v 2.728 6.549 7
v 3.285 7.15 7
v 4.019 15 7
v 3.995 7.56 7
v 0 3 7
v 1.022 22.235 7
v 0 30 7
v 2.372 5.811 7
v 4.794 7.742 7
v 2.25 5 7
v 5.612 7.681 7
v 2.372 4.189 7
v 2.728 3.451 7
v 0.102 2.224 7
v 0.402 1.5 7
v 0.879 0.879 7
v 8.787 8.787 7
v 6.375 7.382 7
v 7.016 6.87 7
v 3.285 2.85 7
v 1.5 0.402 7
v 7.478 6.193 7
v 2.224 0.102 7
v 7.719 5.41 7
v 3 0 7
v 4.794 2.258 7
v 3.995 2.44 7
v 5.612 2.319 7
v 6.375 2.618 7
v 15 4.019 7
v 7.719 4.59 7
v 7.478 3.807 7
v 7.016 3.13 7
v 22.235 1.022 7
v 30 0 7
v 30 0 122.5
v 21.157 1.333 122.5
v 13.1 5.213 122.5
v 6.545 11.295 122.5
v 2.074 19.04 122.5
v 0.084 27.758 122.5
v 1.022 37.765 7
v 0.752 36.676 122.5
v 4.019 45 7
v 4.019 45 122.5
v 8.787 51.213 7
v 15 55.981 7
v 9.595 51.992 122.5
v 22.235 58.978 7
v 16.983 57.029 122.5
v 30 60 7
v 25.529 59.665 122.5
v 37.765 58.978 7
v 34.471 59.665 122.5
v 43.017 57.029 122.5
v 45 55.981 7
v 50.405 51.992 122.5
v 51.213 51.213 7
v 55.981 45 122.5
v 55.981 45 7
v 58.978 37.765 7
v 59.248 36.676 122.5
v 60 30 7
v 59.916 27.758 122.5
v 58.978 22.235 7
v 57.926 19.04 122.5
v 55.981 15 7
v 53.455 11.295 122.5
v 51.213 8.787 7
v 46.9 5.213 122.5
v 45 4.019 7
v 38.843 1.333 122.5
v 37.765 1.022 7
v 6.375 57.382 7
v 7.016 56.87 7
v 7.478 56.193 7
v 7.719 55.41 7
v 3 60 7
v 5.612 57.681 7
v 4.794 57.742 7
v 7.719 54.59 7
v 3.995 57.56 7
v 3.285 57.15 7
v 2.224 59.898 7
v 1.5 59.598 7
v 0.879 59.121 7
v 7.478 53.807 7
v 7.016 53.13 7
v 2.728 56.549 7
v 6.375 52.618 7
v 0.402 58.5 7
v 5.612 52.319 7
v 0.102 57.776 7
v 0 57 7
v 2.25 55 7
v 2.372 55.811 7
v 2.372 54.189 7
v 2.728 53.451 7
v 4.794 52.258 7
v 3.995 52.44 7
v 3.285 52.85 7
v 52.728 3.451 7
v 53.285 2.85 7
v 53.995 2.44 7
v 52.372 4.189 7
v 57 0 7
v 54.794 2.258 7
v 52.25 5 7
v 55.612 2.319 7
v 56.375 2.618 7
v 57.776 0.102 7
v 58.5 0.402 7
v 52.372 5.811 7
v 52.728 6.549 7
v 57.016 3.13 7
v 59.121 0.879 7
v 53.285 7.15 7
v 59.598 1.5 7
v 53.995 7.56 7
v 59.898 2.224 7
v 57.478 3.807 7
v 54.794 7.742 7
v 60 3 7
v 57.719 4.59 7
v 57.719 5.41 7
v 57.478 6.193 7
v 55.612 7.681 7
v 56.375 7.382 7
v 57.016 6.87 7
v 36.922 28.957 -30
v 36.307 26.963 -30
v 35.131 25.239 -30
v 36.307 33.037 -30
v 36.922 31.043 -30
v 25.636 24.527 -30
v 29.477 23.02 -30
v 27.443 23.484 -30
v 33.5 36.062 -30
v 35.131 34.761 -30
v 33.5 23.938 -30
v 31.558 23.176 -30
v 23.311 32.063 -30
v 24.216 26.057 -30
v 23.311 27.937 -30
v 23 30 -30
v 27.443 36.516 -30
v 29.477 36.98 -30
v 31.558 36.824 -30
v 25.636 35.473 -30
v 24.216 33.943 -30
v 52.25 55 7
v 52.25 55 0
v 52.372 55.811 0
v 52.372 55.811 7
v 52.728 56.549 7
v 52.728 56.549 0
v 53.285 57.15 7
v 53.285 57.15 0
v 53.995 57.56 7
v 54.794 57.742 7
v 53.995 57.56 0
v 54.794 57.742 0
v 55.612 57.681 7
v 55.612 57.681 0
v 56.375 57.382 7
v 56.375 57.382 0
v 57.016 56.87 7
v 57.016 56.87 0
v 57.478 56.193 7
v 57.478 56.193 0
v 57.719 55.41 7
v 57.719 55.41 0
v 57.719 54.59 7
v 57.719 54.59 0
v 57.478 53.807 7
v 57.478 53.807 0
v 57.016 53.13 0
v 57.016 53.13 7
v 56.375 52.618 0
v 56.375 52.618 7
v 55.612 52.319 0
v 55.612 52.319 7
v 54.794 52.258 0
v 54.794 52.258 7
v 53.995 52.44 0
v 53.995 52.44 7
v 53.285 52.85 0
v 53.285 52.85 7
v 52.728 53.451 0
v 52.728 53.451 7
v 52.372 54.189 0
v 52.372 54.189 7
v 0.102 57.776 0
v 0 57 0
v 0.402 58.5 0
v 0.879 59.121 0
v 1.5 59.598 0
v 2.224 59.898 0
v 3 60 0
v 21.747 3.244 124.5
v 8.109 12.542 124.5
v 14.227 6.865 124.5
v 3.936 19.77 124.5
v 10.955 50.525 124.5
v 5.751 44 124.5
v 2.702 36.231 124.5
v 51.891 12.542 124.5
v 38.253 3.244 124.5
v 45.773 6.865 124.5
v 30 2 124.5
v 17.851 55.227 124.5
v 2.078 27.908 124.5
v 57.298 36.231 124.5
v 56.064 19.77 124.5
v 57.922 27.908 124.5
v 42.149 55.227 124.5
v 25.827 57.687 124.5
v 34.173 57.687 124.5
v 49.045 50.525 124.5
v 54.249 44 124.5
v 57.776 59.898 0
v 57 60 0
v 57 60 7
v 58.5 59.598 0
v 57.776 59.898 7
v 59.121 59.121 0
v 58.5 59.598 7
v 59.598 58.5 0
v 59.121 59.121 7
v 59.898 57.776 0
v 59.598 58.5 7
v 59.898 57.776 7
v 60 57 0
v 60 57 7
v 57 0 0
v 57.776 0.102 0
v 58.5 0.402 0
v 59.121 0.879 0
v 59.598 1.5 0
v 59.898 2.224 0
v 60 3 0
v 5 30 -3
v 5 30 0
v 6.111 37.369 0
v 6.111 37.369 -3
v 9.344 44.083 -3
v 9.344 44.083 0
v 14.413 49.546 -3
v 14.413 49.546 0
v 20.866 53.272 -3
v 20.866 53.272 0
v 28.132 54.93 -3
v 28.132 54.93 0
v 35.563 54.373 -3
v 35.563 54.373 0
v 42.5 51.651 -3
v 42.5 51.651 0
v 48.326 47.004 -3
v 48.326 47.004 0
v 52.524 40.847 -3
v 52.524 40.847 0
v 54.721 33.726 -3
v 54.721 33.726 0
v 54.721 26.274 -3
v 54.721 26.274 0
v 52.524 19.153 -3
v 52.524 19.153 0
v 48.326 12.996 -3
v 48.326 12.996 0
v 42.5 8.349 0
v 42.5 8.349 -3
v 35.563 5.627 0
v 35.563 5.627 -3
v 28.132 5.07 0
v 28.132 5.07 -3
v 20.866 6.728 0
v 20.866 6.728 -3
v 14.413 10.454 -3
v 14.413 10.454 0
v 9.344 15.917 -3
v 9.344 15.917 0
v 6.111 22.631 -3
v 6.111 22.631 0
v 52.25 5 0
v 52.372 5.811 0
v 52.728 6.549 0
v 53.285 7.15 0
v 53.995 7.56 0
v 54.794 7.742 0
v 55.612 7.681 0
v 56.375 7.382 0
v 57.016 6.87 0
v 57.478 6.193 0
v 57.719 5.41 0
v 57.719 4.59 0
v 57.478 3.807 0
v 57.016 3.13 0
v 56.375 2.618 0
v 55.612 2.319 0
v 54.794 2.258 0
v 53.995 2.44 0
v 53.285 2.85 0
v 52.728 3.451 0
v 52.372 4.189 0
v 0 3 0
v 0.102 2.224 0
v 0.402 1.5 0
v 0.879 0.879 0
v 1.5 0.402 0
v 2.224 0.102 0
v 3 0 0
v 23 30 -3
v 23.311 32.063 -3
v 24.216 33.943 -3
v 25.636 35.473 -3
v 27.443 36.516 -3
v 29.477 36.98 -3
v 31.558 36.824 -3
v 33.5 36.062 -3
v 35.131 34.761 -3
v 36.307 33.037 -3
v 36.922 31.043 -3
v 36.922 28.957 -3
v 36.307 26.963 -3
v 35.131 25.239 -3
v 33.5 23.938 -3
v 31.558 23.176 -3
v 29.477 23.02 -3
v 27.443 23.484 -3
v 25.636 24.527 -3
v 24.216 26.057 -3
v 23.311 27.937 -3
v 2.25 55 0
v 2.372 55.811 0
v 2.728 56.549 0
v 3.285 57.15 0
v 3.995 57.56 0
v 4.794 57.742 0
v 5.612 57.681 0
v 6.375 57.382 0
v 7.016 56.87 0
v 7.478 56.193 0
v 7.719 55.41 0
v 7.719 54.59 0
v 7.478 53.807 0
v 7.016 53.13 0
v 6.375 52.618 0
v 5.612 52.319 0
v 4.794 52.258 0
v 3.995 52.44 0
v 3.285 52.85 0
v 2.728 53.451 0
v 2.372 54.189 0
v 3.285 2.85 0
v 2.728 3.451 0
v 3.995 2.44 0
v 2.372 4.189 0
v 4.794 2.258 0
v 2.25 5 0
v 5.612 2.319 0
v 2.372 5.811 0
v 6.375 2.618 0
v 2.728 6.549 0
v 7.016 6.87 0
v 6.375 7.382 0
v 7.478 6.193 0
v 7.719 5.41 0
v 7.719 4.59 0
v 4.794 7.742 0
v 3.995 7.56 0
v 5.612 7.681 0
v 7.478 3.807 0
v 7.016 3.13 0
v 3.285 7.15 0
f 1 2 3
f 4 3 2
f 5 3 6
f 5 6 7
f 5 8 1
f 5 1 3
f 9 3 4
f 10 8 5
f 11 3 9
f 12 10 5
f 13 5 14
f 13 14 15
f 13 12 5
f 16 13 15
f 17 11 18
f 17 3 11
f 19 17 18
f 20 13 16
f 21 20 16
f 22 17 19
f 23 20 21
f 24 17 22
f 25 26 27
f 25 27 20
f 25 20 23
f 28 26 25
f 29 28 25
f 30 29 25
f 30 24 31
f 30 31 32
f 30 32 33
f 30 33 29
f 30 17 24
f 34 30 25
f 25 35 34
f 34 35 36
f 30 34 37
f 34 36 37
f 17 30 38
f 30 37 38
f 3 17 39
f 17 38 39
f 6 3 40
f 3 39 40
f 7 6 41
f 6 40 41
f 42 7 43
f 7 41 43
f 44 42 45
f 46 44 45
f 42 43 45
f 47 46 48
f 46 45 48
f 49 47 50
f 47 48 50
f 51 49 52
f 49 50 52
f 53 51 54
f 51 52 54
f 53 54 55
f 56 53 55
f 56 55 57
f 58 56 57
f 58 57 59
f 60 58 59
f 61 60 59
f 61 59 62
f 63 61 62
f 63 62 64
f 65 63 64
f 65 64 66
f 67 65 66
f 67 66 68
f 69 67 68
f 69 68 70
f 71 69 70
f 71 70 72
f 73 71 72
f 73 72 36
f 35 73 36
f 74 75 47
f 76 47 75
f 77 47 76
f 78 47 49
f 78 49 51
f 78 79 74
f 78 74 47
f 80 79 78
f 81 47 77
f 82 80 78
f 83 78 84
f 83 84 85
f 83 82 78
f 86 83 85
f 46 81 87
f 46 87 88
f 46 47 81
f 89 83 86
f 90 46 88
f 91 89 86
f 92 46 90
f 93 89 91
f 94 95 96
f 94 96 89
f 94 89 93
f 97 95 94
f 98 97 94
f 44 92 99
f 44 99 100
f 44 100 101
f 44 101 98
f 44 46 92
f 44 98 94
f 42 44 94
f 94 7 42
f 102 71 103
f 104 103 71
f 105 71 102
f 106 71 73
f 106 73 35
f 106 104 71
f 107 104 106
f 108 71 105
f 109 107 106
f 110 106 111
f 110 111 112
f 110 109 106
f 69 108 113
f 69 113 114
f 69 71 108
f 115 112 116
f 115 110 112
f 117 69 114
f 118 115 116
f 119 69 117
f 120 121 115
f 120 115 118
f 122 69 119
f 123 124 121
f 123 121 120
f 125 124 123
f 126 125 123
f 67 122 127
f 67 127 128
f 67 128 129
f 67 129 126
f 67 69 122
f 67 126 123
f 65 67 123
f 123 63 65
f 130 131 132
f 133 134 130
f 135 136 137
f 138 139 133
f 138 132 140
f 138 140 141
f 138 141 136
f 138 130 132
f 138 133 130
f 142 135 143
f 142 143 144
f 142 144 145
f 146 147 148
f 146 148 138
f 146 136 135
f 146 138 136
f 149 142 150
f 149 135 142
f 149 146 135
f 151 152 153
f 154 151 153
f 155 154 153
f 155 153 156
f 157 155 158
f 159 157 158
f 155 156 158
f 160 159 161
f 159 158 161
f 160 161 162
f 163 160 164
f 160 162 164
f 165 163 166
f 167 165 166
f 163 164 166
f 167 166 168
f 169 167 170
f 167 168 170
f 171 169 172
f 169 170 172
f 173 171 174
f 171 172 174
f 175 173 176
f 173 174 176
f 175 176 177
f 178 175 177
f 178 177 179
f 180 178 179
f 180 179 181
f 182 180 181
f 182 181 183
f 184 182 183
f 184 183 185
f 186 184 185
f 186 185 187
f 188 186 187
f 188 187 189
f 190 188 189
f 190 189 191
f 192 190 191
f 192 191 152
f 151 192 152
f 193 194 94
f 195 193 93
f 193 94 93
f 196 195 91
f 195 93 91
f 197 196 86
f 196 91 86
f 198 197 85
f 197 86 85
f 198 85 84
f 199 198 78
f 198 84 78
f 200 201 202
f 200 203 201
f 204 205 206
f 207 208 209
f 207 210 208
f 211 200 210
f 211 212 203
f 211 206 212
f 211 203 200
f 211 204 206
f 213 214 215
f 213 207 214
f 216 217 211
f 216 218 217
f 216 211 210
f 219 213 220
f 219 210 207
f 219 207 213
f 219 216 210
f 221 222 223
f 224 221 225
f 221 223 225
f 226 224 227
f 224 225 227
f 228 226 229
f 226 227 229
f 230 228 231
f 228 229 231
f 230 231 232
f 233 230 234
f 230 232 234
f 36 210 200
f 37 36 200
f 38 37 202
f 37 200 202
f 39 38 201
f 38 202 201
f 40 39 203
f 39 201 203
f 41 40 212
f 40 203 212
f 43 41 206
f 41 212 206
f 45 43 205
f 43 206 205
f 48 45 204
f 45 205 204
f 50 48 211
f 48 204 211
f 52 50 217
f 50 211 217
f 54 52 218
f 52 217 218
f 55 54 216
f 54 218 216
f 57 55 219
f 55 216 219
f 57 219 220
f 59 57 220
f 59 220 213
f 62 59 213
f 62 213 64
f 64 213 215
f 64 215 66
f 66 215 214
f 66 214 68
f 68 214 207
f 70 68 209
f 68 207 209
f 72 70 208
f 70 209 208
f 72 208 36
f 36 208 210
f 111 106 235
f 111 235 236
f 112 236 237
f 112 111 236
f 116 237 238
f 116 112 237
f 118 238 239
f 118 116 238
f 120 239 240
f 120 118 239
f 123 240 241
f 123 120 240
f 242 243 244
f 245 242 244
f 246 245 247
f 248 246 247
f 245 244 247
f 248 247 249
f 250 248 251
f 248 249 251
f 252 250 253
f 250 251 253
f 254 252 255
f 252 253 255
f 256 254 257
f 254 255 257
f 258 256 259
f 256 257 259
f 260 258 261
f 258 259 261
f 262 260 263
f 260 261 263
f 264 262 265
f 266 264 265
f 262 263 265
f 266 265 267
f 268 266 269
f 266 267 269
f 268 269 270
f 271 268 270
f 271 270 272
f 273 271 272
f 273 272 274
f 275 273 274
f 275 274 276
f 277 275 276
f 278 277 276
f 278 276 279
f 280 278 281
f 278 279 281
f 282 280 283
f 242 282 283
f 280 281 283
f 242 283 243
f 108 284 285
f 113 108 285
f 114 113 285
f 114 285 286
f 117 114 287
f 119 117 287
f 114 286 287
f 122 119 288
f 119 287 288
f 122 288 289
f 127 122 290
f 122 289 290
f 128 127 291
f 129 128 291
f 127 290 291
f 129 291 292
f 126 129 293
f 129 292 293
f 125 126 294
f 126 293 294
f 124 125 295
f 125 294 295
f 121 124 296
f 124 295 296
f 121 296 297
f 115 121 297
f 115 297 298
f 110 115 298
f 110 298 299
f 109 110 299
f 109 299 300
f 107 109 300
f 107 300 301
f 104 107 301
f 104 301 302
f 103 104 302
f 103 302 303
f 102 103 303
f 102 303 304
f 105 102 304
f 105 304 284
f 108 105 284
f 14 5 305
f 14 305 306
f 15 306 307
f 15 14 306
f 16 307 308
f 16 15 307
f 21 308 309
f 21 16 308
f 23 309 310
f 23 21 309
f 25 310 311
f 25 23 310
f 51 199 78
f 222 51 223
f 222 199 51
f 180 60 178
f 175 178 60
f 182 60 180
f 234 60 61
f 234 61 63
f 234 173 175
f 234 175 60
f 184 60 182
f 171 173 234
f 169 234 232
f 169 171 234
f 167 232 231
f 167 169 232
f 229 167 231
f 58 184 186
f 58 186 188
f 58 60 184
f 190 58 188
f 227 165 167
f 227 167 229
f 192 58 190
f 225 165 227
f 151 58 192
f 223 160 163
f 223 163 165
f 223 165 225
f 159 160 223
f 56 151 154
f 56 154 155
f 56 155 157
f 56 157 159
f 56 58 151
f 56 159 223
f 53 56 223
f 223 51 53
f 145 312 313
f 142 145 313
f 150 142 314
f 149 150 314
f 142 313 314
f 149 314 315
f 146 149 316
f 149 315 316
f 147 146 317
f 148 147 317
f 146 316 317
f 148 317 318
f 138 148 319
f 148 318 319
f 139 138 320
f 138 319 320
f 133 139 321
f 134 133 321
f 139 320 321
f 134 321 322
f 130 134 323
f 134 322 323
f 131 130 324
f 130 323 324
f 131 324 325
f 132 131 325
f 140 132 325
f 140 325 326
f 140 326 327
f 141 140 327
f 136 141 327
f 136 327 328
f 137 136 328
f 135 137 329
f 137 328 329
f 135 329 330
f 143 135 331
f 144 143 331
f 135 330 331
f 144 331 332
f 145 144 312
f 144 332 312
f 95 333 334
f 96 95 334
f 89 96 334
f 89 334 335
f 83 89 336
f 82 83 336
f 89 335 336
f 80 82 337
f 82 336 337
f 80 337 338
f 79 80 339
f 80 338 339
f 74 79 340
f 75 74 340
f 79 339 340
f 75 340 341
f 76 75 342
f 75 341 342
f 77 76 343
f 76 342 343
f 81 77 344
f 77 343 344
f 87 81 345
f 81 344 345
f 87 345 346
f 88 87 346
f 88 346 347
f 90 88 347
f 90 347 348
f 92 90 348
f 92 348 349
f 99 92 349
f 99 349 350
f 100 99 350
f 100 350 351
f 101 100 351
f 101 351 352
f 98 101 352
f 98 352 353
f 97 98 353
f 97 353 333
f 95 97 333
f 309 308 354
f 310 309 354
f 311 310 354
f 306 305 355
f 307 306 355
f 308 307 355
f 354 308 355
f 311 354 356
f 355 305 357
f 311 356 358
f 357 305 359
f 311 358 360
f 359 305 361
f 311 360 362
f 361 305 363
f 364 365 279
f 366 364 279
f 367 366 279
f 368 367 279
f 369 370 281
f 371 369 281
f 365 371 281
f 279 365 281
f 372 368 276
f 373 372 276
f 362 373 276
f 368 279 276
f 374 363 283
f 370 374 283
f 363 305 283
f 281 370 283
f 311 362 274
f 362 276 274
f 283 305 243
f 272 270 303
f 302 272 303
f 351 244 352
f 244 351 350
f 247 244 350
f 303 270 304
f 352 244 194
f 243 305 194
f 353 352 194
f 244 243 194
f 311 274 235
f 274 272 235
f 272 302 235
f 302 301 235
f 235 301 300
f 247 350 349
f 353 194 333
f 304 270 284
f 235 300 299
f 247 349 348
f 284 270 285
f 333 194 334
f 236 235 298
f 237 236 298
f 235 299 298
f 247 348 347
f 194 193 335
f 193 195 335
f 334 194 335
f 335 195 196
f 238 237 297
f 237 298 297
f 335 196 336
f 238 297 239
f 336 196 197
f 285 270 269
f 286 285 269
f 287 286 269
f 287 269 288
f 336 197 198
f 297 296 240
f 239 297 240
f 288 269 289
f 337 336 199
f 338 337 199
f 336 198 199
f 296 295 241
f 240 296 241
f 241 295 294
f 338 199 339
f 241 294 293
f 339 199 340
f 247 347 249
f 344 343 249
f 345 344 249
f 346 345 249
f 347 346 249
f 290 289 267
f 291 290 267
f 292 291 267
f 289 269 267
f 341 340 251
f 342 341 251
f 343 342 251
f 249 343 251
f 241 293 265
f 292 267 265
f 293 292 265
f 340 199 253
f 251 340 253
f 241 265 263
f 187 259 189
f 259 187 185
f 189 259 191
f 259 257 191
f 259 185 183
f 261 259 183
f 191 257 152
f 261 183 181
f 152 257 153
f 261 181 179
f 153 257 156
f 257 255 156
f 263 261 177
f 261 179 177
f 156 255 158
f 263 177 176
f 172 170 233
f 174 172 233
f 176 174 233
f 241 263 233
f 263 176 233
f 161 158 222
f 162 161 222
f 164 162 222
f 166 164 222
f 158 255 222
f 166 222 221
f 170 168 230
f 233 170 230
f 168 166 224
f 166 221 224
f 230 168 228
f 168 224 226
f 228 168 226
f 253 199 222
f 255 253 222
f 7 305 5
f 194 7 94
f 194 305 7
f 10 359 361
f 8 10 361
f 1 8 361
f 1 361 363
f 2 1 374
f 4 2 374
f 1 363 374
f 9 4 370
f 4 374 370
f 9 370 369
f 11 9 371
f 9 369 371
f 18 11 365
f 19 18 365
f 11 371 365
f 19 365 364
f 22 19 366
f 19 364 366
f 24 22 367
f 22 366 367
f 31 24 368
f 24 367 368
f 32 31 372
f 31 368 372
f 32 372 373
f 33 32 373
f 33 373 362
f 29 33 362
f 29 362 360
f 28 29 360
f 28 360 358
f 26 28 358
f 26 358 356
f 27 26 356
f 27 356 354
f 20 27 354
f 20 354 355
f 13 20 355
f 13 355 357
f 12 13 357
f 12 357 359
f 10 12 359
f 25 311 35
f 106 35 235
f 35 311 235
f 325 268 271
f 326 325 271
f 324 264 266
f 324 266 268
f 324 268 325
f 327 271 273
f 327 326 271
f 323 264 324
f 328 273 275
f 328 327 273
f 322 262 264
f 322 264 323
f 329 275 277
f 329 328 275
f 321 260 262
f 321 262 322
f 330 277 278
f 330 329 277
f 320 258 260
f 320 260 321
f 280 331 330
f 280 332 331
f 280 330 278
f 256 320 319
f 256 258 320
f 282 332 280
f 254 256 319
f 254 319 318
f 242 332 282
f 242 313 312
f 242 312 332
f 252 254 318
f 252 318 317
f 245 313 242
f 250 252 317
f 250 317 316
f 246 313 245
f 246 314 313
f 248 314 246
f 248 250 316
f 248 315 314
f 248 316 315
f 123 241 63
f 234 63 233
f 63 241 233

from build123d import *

# Parameters (mm, degrees)
SKETCH_1_W               = 60.00000000000001
SKETCH_1_H               = 60.00000000000001
EXTRUDE_1_DEPTH          = 124.5
SKETCH_2_R               = 25
EXTRUDE_2_DEPTH          = 3
SKETCH_3_R               = 6.999999999999999
EXTRUDE_3_DEPTH          = 27
FILLET_1_R               = 3
CUT_EXTRUDE_1_DEPTH      = 117.5
PATTERN_CIRCULAR_1_COUNT = 4
CHAMFER_1_SIZE           = 2
SKETCH_5_R               = 2.75
SKETCH_5_R_2             = 2.7500000000000018
SKETCH_5_R_3             = 2.7500000000000004
SKETCH_5_R_4             = 2.750000000000002
CUT_EXTRUDE_2_DEPTH      = 151.66602138504885


with BuildPart() as part:
    # 草圖1 → 伸長1 (new body)
    with BuildSketch(Plane.XY):
        with Locations((30.000000000000004, 30.000000000000004)):
            Rectangle(SKETCH_1_W, SKETCH_1_H)
    extrude(amount=EXTRUDE_1_DEPTH)

    # 草圖2 → 伸長2 (add)
    with BuildSketch(Plane(origin=(0, 0, 0), x_dir=(-1, 0, 0), z_dir=(0, 0, -1))):
        with Locations((-30.000000000000007, 30)):
            Circle(SKETCH_2_R)
    extrude(amount=EXTRUDE_2_DEPTH)

    # 草圖3 → 伸長3 (add)
    with BuildSketch(Plane(origin=(0, 0, -3), x_dir=(-1, 0, 0), z_dir=(0, 0, -1))):
        with Locations((-30.000000000000007, 30)):
            Circle(SKETCH_3_R)
    extrude(amount=EXTRUDE_3_DEPTH)

    # 圓角1
    fillet_1_edges = [part.edges().sort_by_distance(p)[0] for p in [
        (0, 60, 62.25),
        (60, 60, 62.25),
        (60, 0, 62.25),
        (0, 0, 62.25),
    ]]
    fillet(fillet_1_edges, radius=FILLET_1_R)

    # 草圖4 → 除料-伸長1 (cut)
    with BuildSketch(Plane.XY.offset(124.5)):
        with BuildLine():
            Line((60, 3), (60, 30.000000000000007))
            ThreePointArc((60, 30.000000000000007), (51.213203435596434, 8.786796564403577), (30, 0))
            Line((30, 0), (56.99999999999999, 0))
            ThreePointArc((56.99999999999999, 0), (59.12132034355964, 0.8786796564403576), (60, 3))
        make_face()
    cut_extrude_1 = extrude(amount=-CUT_EXTRUDE_1_DEPTH, mode=Mode.SUBTRACT)

    # 環狀複製排列1: 除料-伸長1 ×4 about axis
    pattern_circular_1_axis = Axis((30, 30, 0), (0, 0, 1))
    for i in range(1, PATTERN_CIRCULAR_1_COUNT):
        add(cut_extrude_1.rotate(pattern_circular_1_axis, i * 360 / PATTERN_CIRCULAR_1_COUNT), mode=Mode.SUBTRACT)

    # 導角1
    chamfer_1_edges = [part.edges().sort_by_distance(p)[0] for p in [
        (29.999999999999982, 59.99999999999999, 124.5),
    ]]
    chamfer(chamfer_1_edges, length=CHAMFER_1_SIZE)

    # 草圖5 → 除料-伸長2 (cut, through all)
    with BuildSketch(Plane(origin=(0, 0, 0), x_dir=(-1, 0, 0), z_dir=(0, 0, -1))):
        with Locations((-4.999999999999972, 4.999999999999999)):
            Circle(SKETCH_5_R)
        with Locations((-54.99999999999997, 4.999999999999987)):
            Circle(SKETCH_5_R_2)
        with Locations((-4.99999999999997, 54.99999999999999)):
            Circle(SKETCH_5_R_3)
        with Locations((-55, 54.99999999999998)):
            Circle(SKETCH_5_R_4)
    extrude(amount=-CUT_EXTRUDE_2_DEPTH, mode=Mode.SUBTRACT)


solid = part.part
